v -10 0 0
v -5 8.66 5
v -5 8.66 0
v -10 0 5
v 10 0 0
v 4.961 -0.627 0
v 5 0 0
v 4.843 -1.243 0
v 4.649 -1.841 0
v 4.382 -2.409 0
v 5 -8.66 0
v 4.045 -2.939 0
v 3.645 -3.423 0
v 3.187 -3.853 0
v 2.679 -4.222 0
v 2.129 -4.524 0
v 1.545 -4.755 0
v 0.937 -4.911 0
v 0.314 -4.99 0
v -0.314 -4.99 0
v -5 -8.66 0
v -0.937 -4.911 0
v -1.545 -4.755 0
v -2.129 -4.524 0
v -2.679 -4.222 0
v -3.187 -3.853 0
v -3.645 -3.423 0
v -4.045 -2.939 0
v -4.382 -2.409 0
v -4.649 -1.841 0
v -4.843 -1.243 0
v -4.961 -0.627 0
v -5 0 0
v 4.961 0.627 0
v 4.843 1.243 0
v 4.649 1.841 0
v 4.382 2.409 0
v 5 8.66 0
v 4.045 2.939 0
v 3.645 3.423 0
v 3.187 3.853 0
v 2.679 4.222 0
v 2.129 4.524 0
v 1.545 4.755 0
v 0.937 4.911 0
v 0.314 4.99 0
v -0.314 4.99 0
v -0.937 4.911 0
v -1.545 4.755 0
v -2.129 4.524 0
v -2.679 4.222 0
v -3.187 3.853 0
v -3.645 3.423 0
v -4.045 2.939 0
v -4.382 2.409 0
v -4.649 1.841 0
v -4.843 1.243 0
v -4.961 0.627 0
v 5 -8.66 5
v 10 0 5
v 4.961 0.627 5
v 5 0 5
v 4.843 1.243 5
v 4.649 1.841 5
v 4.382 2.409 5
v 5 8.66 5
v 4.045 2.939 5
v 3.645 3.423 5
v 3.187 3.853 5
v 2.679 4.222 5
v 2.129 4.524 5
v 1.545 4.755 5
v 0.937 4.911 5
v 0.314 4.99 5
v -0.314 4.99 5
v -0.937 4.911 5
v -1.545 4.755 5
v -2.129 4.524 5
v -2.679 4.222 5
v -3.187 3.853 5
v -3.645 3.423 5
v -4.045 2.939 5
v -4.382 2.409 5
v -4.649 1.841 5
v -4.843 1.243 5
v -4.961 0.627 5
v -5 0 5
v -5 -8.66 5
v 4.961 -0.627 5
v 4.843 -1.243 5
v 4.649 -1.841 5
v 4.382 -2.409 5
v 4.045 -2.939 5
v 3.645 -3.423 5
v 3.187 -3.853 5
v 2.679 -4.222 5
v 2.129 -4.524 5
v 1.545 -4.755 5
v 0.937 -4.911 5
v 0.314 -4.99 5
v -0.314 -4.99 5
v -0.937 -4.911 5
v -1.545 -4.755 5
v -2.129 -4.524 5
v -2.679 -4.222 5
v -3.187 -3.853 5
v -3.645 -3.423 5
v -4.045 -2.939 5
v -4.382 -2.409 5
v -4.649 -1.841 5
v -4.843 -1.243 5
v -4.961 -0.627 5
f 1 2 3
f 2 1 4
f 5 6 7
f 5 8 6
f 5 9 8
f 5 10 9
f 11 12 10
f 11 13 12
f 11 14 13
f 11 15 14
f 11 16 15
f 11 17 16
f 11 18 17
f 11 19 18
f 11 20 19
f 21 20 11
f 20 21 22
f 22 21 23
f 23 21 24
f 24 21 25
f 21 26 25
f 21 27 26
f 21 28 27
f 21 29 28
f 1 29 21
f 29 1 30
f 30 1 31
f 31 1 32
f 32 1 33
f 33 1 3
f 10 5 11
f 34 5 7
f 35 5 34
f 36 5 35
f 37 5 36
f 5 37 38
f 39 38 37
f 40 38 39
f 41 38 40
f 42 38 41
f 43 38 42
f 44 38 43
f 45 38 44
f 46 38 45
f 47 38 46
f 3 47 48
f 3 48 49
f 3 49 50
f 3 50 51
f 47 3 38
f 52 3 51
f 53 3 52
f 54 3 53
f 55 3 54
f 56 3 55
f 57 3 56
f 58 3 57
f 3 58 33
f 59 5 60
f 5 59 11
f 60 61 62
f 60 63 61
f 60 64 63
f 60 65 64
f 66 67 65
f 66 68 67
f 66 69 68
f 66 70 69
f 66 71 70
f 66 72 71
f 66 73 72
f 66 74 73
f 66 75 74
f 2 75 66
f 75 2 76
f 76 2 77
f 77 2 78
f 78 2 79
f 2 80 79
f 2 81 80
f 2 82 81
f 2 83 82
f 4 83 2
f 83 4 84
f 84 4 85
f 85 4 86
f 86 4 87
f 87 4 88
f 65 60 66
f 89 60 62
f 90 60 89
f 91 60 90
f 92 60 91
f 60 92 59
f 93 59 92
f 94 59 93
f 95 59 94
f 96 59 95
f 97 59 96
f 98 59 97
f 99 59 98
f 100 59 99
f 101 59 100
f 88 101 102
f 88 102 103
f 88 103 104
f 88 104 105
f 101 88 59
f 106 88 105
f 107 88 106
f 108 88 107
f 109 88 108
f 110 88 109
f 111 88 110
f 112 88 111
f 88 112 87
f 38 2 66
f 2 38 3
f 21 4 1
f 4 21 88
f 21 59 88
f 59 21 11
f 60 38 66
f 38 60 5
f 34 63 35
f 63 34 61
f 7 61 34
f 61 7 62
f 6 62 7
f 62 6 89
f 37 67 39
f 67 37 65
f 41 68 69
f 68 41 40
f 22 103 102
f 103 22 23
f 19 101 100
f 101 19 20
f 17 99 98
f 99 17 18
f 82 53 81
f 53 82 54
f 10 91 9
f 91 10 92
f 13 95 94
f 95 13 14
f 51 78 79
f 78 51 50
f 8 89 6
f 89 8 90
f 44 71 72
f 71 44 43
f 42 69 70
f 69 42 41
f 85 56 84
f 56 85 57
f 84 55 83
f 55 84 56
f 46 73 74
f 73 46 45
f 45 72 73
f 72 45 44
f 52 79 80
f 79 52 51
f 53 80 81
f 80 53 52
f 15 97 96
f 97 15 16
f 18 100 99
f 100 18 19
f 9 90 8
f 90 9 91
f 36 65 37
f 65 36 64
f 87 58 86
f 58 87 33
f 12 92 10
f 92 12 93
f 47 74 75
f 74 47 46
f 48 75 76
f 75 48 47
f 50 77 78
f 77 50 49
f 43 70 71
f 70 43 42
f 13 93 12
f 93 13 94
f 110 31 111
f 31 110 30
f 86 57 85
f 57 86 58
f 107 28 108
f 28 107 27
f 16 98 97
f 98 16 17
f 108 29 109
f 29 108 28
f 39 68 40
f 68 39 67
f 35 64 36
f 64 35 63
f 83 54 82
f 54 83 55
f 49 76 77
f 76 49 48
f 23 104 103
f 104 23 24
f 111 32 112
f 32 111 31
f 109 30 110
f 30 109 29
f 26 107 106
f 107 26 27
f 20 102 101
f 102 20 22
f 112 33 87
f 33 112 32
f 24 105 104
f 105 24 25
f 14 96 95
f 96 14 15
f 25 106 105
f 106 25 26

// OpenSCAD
// Nut model.

$fn = 50;
OX = 0.01;

// 2D nut polygon.
module regular_polygon(order, r = 1) {
    angles = [for(i = [0 : order - 1]) i * (360 / order)];
    coords = [for(th = angles) [r * cos(th), r * sin(th)]];
    polygon(coords);
}

// Simple nut model.
// d - rod diameter.
// m - nut height.
// e - max outer nut diameter.
// order - nut corner count.
// material - nut color.
module nut(d = 10, m = 5, e = 20, order = 6, material = [0.8, 0.8, 0.8]) {
    color(material) difference() {
        linear_extrude(height = m) regular_polygon(order, e / 2);
        translate([0, 0, -OX]) cylinder(r = d / 2, h = m + 2 * OX);
    }
}

// Example:
nut(10, 5, 20);
